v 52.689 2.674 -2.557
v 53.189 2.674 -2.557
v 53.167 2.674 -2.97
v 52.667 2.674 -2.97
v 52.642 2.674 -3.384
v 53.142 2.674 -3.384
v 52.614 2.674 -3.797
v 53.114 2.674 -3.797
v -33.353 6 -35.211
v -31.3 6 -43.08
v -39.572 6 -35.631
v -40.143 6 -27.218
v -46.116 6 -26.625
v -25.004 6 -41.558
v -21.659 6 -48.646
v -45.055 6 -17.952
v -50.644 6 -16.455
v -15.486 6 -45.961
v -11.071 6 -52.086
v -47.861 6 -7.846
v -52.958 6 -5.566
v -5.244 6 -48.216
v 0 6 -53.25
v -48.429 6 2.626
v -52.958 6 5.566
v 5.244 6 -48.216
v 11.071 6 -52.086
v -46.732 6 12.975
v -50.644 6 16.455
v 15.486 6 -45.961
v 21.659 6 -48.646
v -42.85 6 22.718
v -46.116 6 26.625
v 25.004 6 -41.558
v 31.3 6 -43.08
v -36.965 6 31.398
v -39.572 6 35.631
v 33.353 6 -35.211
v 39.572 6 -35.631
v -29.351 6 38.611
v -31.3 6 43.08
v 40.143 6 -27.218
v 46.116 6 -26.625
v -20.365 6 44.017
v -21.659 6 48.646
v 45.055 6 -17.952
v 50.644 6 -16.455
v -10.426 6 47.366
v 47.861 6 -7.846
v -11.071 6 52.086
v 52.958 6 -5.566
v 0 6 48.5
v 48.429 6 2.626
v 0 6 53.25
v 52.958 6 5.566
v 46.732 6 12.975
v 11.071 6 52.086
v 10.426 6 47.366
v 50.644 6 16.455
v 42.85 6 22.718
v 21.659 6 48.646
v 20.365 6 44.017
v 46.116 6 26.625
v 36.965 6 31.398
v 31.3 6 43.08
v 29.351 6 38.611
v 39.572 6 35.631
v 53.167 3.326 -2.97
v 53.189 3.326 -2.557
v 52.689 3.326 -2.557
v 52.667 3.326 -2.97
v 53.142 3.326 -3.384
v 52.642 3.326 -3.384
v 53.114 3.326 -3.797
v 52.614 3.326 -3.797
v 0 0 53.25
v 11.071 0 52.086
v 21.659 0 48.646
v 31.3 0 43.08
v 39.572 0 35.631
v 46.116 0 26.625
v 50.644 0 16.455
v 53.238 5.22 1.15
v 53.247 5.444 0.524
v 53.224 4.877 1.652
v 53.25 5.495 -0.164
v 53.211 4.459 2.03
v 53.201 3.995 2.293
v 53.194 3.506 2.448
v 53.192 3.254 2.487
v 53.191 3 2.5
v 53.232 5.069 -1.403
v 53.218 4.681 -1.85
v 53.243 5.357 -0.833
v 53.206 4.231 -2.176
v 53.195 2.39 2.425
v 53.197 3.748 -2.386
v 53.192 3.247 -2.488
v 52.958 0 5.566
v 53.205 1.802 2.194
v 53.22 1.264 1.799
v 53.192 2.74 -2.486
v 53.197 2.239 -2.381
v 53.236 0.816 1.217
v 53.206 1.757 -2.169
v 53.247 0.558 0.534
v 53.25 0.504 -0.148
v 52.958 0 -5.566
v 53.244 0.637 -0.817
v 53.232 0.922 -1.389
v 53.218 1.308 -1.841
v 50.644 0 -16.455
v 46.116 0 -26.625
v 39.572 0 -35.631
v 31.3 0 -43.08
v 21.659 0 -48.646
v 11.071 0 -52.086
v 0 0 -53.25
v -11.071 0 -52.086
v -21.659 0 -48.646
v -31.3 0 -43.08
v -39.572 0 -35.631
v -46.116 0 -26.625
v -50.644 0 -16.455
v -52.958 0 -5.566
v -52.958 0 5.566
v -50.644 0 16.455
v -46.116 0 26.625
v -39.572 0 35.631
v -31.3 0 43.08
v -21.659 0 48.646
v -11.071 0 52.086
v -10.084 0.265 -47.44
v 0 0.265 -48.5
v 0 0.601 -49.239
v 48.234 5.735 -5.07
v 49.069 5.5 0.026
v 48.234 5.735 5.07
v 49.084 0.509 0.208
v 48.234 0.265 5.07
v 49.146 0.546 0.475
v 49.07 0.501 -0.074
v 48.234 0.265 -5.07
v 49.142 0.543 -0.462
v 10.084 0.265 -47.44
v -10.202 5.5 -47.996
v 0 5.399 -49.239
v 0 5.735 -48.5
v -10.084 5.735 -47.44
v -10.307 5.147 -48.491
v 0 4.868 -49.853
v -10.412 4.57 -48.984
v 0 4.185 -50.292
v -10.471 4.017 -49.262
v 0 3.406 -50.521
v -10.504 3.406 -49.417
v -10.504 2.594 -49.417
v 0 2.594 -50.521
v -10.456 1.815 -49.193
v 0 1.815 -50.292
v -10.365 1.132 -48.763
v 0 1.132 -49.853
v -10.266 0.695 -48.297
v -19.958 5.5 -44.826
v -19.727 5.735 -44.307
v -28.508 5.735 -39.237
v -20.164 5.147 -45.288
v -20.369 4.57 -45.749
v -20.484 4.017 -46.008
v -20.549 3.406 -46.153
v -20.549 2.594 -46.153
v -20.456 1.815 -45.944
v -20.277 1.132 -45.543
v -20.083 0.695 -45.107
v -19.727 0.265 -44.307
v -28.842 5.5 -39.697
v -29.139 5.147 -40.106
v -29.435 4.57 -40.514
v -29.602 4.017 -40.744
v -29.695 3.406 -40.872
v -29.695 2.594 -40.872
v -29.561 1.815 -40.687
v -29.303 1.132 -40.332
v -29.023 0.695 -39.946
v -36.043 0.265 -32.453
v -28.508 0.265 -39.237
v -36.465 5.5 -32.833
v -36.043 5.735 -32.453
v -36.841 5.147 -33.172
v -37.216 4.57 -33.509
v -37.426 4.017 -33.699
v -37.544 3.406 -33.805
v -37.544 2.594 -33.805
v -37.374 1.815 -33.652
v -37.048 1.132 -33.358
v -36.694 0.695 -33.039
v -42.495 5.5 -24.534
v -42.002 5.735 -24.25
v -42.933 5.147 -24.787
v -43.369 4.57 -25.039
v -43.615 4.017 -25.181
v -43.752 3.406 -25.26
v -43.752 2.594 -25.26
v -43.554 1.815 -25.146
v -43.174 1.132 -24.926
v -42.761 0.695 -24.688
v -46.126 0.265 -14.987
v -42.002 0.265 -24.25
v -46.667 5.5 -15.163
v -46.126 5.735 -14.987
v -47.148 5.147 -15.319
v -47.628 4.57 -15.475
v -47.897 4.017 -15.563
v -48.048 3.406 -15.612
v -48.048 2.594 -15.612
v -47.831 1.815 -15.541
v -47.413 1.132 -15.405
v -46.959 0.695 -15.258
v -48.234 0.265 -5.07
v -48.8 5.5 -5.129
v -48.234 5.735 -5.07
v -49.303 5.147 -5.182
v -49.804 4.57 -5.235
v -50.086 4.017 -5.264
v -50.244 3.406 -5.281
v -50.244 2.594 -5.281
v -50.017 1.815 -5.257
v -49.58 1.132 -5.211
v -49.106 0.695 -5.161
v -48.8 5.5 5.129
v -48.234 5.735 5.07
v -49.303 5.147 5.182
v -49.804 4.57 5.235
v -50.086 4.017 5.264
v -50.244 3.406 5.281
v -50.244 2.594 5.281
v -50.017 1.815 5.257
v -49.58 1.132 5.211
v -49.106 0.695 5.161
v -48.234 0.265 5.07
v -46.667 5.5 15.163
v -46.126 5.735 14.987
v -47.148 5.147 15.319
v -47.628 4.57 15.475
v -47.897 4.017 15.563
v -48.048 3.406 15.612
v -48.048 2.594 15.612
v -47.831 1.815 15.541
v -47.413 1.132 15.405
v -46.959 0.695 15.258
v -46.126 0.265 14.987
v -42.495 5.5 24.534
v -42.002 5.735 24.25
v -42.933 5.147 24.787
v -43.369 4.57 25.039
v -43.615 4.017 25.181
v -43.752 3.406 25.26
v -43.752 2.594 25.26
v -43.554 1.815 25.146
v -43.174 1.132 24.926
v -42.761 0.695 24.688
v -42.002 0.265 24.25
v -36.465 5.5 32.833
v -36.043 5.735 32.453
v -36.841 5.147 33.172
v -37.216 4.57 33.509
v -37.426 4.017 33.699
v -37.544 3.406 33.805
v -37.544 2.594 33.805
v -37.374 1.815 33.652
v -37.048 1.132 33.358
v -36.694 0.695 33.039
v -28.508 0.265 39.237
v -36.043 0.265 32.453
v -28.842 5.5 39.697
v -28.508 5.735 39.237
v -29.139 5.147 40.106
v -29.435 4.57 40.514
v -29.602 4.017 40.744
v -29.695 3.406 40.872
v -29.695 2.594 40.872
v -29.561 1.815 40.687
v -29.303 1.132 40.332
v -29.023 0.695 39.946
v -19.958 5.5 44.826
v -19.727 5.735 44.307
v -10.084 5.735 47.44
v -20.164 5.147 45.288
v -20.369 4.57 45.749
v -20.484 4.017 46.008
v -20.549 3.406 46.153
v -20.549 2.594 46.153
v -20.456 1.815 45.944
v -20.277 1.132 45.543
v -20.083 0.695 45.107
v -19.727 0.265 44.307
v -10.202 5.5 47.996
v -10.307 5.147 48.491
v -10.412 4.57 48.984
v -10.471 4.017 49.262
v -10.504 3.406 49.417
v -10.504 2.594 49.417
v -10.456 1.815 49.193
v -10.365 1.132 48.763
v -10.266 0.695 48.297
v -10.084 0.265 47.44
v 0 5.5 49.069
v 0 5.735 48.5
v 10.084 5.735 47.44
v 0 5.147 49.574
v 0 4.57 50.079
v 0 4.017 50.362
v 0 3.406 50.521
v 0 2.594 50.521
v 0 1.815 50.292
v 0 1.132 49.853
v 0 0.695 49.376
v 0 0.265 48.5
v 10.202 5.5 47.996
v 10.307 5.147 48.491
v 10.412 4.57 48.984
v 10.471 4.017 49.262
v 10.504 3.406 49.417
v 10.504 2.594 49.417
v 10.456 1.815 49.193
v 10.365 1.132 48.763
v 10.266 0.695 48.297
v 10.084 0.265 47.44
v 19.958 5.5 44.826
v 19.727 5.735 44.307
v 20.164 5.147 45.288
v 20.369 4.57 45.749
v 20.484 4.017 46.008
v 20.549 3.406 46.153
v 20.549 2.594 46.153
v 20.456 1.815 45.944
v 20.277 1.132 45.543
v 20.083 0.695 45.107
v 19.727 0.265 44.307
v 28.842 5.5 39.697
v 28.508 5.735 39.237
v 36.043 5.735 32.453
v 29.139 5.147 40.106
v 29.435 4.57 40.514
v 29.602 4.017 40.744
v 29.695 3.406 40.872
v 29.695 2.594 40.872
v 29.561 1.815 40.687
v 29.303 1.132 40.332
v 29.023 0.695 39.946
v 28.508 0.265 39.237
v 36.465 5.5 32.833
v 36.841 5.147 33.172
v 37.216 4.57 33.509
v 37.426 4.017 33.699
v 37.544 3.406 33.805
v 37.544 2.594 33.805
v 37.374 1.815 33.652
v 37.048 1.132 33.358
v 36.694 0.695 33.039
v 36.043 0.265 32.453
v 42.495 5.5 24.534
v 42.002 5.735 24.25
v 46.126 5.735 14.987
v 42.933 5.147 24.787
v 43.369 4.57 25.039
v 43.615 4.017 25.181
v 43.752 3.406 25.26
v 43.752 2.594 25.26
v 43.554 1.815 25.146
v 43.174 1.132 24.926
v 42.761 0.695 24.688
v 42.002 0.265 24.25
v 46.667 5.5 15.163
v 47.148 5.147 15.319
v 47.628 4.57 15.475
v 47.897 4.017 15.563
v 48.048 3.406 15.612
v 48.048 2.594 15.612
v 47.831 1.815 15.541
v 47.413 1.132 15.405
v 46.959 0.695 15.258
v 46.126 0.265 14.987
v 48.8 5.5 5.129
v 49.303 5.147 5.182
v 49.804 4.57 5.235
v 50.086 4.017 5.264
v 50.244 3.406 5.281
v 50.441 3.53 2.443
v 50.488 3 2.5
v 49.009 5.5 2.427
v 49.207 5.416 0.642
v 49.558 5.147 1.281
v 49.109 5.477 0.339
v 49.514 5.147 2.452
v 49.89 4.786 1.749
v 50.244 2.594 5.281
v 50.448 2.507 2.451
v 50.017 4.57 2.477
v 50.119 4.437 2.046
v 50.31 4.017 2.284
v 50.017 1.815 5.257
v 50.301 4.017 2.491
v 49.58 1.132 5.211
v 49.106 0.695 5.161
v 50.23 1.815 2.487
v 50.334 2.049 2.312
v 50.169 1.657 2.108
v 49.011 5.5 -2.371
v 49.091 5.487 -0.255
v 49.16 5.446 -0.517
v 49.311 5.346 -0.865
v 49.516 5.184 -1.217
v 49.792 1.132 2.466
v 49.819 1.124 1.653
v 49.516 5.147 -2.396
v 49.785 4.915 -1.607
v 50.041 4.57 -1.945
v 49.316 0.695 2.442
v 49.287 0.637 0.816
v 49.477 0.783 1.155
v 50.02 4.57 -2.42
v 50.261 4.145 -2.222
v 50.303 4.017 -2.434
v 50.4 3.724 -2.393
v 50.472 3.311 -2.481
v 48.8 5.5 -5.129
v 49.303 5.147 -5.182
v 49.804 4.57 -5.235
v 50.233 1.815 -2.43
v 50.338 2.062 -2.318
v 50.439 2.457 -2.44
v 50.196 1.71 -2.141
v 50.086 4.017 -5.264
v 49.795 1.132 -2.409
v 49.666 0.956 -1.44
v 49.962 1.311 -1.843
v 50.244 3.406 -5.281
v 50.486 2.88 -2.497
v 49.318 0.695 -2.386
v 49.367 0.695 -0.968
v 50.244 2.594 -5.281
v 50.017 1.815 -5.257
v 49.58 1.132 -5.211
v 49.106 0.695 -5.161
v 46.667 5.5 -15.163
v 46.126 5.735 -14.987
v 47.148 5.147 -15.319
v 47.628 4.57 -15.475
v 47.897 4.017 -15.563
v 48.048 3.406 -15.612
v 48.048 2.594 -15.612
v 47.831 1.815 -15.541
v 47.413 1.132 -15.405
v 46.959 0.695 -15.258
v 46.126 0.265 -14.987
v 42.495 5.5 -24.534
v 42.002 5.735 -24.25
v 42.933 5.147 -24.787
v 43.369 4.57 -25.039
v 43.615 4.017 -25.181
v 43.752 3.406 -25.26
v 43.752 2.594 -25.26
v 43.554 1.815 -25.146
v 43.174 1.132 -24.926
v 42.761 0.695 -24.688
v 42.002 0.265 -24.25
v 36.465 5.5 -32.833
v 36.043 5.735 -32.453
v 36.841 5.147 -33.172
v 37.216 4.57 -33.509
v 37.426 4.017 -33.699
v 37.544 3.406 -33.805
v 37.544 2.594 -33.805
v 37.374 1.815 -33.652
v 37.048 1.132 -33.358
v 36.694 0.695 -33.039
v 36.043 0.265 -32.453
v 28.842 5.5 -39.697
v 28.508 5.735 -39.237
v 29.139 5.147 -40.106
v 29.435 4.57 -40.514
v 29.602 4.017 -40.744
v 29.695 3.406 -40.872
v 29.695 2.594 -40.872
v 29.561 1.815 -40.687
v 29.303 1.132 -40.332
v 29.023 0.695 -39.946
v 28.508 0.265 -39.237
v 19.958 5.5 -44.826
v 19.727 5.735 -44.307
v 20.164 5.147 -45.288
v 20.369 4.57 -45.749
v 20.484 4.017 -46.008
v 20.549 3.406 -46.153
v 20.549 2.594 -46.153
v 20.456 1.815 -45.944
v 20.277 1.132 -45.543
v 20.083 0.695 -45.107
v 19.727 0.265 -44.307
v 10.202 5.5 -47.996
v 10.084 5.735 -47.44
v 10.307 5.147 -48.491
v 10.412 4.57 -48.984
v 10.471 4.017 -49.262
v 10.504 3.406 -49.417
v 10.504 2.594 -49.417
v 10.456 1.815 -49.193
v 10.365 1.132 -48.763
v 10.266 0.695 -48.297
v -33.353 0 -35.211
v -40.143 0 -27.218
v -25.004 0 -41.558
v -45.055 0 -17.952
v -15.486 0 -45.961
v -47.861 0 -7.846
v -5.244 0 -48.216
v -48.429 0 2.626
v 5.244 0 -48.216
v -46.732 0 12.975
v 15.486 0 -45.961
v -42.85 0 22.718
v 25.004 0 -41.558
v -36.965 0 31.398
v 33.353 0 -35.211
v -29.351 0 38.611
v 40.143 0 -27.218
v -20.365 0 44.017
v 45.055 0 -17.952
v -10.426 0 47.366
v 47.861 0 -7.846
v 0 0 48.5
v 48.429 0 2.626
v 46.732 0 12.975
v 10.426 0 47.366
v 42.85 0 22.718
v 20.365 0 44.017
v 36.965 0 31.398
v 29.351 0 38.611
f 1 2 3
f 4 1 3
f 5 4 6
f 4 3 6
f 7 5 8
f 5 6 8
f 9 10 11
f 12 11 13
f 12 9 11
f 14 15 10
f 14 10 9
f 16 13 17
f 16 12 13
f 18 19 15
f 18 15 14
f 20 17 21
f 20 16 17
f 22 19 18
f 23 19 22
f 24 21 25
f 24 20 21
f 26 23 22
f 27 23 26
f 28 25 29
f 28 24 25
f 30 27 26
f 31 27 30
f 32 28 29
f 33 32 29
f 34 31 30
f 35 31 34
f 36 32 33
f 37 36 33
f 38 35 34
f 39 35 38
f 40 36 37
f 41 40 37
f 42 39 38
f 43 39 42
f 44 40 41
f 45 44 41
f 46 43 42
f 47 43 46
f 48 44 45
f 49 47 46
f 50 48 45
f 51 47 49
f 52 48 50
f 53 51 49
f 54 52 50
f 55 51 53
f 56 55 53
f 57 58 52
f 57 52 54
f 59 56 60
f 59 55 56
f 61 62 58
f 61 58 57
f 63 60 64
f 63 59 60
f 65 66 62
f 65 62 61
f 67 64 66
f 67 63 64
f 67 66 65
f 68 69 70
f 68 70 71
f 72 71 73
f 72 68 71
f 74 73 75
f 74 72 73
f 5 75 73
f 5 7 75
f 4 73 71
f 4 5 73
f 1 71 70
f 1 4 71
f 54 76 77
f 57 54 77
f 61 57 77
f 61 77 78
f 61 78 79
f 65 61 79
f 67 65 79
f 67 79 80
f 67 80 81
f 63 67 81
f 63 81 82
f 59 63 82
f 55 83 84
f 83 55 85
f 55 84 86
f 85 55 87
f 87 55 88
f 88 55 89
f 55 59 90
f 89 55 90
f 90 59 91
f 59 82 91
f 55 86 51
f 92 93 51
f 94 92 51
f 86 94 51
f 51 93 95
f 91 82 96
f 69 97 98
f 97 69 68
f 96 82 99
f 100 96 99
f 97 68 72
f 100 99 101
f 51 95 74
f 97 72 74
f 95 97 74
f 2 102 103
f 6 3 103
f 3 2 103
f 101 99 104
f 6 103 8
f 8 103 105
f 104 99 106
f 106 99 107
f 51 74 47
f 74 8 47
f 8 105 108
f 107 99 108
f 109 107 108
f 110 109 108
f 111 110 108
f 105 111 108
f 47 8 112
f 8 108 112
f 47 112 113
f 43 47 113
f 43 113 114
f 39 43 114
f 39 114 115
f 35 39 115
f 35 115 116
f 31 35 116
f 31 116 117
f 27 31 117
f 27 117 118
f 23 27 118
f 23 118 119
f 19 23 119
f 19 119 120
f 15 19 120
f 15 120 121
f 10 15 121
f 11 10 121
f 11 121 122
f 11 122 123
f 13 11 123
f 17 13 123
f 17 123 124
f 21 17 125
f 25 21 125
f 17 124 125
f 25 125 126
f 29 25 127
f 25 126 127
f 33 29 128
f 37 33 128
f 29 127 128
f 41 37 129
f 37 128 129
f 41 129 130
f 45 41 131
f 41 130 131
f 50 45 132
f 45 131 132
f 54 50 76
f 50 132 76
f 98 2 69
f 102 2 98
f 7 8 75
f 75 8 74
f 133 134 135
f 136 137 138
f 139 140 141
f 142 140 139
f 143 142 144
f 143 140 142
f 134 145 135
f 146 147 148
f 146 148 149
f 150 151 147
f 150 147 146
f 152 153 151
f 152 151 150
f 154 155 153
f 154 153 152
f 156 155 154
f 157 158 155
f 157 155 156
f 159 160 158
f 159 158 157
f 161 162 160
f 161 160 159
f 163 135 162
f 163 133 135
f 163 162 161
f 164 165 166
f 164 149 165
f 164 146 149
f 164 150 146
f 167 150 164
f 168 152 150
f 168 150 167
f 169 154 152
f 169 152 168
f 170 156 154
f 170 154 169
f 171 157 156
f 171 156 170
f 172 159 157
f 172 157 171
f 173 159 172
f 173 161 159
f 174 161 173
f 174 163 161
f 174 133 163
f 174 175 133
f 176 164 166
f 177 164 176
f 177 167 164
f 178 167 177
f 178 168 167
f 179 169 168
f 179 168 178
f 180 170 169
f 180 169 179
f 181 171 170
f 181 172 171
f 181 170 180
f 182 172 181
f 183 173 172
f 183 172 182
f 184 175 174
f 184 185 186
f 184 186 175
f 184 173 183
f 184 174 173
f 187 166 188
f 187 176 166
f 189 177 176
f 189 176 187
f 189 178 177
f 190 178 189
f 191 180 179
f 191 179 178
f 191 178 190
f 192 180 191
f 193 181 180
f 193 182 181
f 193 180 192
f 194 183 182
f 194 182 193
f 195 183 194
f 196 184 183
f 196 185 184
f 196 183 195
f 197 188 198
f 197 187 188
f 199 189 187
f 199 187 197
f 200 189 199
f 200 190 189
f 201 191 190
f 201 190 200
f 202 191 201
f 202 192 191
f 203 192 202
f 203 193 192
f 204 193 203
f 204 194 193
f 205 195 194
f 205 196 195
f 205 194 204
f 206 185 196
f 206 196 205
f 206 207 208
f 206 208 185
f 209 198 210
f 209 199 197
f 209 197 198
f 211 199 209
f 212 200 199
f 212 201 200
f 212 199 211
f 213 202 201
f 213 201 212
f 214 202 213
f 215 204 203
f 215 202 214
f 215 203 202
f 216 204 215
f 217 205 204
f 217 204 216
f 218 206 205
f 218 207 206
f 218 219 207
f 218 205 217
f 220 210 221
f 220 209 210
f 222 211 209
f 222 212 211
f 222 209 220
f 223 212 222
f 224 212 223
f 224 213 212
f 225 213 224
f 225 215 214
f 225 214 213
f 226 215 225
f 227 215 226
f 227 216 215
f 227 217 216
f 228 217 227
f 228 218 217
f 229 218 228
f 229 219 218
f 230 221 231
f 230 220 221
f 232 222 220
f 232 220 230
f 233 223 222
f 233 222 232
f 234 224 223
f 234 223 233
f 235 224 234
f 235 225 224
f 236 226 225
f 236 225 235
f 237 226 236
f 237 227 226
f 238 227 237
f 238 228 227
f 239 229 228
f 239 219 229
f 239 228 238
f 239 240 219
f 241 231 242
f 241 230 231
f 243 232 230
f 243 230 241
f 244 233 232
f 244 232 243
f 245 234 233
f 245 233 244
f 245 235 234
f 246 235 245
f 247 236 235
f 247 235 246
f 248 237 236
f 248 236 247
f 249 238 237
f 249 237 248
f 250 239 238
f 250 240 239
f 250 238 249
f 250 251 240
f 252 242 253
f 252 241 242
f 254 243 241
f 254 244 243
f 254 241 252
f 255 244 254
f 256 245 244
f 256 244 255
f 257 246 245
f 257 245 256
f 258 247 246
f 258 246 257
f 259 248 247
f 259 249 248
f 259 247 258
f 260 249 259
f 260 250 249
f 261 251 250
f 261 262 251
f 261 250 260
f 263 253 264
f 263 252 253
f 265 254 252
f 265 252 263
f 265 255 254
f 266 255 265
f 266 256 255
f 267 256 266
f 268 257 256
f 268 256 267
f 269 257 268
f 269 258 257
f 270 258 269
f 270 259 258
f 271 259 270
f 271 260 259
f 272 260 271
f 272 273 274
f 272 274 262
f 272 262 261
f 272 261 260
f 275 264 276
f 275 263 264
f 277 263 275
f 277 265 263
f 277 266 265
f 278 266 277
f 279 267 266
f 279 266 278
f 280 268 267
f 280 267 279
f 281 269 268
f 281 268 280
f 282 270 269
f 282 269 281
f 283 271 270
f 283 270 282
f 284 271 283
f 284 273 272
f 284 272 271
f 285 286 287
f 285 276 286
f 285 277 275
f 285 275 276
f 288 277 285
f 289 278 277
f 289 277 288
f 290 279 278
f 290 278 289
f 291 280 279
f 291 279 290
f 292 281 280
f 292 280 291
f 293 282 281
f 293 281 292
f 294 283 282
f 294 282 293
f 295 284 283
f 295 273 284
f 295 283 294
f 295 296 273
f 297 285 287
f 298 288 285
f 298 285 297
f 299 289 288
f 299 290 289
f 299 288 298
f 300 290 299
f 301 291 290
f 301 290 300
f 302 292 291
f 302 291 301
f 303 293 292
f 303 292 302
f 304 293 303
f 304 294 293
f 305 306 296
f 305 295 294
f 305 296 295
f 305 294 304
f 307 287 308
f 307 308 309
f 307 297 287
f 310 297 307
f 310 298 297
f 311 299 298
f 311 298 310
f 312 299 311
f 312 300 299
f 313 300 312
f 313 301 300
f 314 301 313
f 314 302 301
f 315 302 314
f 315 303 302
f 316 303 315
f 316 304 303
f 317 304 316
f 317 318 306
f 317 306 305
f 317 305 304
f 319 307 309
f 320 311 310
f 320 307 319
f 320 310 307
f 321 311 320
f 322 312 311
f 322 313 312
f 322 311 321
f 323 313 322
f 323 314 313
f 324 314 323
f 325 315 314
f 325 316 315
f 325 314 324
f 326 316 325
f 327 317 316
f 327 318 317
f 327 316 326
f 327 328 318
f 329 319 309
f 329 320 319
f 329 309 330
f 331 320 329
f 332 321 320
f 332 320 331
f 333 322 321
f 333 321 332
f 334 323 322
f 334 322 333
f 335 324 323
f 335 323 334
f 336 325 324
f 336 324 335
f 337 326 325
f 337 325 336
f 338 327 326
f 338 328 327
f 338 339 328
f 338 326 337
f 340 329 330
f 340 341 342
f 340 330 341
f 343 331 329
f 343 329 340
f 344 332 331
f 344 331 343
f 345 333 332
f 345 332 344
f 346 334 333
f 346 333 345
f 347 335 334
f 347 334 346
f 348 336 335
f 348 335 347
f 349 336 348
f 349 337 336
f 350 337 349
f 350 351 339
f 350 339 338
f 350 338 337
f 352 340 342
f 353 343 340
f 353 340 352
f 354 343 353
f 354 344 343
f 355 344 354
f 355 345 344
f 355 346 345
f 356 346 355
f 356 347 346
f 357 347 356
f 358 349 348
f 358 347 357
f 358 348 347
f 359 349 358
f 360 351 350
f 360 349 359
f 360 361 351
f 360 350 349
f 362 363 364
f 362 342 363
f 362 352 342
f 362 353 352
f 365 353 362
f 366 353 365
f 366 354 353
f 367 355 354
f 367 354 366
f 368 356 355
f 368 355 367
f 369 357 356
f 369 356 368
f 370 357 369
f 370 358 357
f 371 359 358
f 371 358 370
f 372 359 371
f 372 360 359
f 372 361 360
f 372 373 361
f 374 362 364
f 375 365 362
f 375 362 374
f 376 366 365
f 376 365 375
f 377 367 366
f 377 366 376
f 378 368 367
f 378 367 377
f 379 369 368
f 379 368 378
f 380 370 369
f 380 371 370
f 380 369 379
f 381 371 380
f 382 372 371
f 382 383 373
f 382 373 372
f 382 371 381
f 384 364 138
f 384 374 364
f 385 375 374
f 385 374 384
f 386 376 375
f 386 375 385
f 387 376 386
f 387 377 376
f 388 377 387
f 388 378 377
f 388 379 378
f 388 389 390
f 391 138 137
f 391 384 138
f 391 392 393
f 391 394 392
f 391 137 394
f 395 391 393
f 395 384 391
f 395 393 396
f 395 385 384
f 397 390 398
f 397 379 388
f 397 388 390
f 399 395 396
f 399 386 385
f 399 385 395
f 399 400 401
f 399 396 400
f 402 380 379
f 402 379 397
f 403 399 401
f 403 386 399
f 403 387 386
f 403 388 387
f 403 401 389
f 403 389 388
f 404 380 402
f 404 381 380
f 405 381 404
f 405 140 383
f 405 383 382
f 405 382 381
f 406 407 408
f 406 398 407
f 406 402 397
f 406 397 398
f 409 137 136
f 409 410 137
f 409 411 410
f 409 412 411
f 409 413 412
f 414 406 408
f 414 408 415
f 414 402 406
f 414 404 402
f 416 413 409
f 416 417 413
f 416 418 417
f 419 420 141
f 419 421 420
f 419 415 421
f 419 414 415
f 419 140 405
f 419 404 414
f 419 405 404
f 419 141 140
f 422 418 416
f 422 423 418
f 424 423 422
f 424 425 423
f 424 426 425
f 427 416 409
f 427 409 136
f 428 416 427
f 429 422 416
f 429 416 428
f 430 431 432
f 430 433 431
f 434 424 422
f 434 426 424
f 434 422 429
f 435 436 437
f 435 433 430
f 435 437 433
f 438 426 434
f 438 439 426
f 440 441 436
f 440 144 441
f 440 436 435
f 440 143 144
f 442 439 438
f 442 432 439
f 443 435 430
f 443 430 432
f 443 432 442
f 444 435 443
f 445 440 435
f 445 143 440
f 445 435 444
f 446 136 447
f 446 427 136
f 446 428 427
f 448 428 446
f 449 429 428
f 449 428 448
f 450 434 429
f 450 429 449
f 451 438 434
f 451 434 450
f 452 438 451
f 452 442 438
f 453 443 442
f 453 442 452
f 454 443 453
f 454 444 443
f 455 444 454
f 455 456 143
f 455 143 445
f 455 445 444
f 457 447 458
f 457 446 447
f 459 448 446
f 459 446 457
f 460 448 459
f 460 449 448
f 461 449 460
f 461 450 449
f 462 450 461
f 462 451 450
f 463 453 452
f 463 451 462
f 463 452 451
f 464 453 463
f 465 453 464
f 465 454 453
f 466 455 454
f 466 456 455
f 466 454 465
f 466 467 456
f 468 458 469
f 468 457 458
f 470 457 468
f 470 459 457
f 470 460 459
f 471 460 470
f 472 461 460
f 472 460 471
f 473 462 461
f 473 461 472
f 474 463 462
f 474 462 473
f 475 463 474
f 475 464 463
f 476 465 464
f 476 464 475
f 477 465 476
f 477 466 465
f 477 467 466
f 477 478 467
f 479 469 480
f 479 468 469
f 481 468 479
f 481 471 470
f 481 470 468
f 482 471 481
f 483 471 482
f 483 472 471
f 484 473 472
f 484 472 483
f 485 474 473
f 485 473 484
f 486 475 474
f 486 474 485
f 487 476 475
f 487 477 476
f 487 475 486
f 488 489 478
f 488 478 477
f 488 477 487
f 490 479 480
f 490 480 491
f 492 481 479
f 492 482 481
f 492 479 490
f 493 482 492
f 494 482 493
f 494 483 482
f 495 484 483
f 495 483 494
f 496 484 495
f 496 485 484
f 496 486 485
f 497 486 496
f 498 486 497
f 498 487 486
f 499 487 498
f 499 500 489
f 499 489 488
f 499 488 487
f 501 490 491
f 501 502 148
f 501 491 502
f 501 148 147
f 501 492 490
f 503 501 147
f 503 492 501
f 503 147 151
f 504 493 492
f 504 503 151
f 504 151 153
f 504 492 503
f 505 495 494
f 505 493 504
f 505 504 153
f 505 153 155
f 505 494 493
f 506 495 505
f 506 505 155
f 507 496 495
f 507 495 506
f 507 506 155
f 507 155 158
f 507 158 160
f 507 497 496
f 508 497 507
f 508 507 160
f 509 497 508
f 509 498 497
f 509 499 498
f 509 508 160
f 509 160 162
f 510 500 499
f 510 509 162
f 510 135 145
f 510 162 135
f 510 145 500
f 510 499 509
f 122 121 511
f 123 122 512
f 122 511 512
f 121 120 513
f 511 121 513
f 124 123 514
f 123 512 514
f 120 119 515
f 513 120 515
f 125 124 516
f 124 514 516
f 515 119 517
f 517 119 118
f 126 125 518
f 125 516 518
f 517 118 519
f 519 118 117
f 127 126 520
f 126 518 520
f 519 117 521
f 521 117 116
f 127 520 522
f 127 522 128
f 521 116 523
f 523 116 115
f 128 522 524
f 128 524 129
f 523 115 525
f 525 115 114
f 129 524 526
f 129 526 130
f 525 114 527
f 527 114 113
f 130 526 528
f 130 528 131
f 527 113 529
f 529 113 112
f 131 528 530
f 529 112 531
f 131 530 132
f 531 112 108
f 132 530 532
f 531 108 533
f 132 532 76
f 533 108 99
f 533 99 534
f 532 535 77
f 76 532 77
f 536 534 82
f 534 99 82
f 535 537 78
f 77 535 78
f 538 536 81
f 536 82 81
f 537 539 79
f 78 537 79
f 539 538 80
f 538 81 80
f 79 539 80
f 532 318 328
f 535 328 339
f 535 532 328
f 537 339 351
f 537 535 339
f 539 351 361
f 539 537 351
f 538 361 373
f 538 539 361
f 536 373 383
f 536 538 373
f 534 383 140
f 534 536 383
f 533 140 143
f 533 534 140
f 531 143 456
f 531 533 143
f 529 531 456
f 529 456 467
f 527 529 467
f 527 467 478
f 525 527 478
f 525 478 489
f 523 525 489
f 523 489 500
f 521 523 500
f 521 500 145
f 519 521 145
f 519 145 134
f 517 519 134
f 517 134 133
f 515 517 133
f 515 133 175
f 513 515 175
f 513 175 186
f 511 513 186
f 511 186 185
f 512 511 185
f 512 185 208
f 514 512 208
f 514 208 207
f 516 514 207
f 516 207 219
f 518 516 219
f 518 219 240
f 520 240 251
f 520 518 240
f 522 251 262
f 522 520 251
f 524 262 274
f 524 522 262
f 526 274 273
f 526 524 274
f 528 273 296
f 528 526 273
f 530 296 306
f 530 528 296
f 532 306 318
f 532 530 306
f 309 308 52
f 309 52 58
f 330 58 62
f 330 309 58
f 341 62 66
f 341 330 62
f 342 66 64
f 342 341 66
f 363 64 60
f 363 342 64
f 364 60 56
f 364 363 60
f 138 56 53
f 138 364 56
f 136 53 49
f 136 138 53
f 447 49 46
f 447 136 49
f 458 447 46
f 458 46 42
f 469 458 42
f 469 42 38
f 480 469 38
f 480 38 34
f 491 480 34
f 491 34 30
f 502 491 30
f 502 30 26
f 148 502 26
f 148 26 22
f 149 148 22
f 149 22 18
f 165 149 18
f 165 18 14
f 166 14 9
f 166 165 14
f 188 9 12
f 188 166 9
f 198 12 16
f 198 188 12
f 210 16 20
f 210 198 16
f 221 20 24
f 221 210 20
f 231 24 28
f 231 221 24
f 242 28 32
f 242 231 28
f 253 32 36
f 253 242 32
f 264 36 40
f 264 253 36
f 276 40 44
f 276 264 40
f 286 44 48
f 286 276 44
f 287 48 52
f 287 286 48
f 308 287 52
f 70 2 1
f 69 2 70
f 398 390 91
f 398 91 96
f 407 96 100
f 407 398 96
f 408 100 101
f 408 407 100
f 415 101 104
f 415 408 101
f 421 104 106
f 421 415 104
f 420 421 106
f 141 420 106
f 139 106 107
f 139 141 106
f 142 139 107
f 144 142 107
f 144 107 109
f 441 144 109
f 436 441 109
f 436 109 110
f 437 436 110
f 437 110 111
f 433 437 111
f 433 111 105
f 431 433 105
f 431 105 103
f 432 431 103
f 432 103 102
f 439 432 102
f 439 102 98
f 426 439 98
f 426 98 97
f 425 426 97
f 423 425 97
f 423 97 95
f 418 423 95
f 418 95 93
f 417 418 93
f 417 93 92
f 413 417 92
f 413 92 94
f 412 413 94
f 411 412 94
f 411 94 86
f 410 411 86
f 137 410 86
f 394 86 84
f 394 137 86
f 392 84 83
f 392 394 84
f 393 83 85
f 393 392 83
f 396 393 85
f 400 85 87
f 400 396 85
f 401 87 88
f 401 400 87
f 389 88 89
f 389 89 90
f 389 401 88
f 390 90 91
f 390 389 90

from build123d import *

# Parameters (mm, degrees)
SKETCH1_R                 = 53.25
SKETCH1_R_2               = 48.5
BOSS_EXTRUDE1_DEPTH       = 6
SKETCH3_R                 = 2.85
SKETCH4_R                 = 2.5
CUT_EXTRUDE1_DEPTH        = 120
CUT_EXTRUDE2_REACH        = 78.046
CUT_EXTRUDE2_START_RADIUS = 53.25
CUT_EXTRUDE2_END_RADIUS   = 53.25
SKETCH6_W                 = 1.240344628
SKETCH6_H                 = 0.651674146


with BuildPart() as part:
    # Sketch1 → Boss-Extrude1 (new body)
    with BuildSketch(Plane(origin=(0, 0, 0), x_dir=(1, 0, 0), z_dir=(0, 1, 0))):
        with Locations(Location((0, 0, 0), (0, 0, 270))):
            Circle(SKETCH1_R)
        with Locations(Location((0, 0, 0), (0, 0, 270))):
            Circle(SKETCH1_R_2, mode=Mode.SUBTRACT)
    extrude(amount=BOSS_EXTRUDE1_DEPTH)

    # Sketch3 → Cut-Revolve1 (revolve, cut)
    with BuildSketch(Plane.XY, mode=Mode.PRIVATE) as cut_revolve1_sk:
        with Locations((-47.7, 3)):
            Circle(SKETCH3_R)
    revolve(cut_revolve1_sk.sketch.rotate(Axis((0, 0, 0), (0, 1, 0)), 270), axis=Axis((0, 0, 0), (0, 1, 0)), mode=Mode.SUBTRACT)

    # Sketch4 → Cut-Extrude1 (cut)
    with BuildSketch(Plane(origin=(0, 0, 0), x_dir=(0, 0, -1), z_dir=(1, 0, 0))):
        with Locations(Location((0, 3, 0), (0, 0, 180))):
            Circle(SKETCH4_R)
    extrude(amount=CUT_EXTRUDE1_DEPTH, mode=Mode.SUBTRACT)

    # Cut-Extrude2: from a cylinder face, 78.046 long prism both ways, kept between that surface and its translate by the depth
    cut_extrude2_start = Plane(origin=(0, 3, 0), z_dir=(0, -1, 0)) * Cylinder(CUT_EXTRUDE2_START_RADIUS, 263.592, mode=Mode.PRIVATE)
    cut_extrude2_end = Plane(origin=(-0.5, 3, 0), z_dir=(0, -1, 0)) * Cylinder(CUT_EXTRUDE2_END_RADIUS, 263.592, mode=Mode.PRIVATE)
    # Sketch6 → Cut-Extrude2 (cut, from a surface)
    with BuildSketch(Plane(origin=(0, 0, 0), x_dir=(0, 0, -1), z_dir=(1, 0, 0)), mode=Mode.PRIVATE) as cut_extrude2_sk1:
        with Locations((3.176747556, 3)):
            Rectangle(SKETCH6_W, SKETCH6_H)
    cut_extrude2_tool1 = extrude(cut_extrude2_sk1.sketch, amount=CUT_EXTRUDE2_REACH, both=True, mode=Mode.PRIVATE)
    add(((cut_extrude2_tool1 & cut_extrude2_start) - cut_extrude2_end).solids().sort_by_distance((52.901527, 3, -3.176748))[0], mode=Mode.SUBTRACT)


solid = part.part
